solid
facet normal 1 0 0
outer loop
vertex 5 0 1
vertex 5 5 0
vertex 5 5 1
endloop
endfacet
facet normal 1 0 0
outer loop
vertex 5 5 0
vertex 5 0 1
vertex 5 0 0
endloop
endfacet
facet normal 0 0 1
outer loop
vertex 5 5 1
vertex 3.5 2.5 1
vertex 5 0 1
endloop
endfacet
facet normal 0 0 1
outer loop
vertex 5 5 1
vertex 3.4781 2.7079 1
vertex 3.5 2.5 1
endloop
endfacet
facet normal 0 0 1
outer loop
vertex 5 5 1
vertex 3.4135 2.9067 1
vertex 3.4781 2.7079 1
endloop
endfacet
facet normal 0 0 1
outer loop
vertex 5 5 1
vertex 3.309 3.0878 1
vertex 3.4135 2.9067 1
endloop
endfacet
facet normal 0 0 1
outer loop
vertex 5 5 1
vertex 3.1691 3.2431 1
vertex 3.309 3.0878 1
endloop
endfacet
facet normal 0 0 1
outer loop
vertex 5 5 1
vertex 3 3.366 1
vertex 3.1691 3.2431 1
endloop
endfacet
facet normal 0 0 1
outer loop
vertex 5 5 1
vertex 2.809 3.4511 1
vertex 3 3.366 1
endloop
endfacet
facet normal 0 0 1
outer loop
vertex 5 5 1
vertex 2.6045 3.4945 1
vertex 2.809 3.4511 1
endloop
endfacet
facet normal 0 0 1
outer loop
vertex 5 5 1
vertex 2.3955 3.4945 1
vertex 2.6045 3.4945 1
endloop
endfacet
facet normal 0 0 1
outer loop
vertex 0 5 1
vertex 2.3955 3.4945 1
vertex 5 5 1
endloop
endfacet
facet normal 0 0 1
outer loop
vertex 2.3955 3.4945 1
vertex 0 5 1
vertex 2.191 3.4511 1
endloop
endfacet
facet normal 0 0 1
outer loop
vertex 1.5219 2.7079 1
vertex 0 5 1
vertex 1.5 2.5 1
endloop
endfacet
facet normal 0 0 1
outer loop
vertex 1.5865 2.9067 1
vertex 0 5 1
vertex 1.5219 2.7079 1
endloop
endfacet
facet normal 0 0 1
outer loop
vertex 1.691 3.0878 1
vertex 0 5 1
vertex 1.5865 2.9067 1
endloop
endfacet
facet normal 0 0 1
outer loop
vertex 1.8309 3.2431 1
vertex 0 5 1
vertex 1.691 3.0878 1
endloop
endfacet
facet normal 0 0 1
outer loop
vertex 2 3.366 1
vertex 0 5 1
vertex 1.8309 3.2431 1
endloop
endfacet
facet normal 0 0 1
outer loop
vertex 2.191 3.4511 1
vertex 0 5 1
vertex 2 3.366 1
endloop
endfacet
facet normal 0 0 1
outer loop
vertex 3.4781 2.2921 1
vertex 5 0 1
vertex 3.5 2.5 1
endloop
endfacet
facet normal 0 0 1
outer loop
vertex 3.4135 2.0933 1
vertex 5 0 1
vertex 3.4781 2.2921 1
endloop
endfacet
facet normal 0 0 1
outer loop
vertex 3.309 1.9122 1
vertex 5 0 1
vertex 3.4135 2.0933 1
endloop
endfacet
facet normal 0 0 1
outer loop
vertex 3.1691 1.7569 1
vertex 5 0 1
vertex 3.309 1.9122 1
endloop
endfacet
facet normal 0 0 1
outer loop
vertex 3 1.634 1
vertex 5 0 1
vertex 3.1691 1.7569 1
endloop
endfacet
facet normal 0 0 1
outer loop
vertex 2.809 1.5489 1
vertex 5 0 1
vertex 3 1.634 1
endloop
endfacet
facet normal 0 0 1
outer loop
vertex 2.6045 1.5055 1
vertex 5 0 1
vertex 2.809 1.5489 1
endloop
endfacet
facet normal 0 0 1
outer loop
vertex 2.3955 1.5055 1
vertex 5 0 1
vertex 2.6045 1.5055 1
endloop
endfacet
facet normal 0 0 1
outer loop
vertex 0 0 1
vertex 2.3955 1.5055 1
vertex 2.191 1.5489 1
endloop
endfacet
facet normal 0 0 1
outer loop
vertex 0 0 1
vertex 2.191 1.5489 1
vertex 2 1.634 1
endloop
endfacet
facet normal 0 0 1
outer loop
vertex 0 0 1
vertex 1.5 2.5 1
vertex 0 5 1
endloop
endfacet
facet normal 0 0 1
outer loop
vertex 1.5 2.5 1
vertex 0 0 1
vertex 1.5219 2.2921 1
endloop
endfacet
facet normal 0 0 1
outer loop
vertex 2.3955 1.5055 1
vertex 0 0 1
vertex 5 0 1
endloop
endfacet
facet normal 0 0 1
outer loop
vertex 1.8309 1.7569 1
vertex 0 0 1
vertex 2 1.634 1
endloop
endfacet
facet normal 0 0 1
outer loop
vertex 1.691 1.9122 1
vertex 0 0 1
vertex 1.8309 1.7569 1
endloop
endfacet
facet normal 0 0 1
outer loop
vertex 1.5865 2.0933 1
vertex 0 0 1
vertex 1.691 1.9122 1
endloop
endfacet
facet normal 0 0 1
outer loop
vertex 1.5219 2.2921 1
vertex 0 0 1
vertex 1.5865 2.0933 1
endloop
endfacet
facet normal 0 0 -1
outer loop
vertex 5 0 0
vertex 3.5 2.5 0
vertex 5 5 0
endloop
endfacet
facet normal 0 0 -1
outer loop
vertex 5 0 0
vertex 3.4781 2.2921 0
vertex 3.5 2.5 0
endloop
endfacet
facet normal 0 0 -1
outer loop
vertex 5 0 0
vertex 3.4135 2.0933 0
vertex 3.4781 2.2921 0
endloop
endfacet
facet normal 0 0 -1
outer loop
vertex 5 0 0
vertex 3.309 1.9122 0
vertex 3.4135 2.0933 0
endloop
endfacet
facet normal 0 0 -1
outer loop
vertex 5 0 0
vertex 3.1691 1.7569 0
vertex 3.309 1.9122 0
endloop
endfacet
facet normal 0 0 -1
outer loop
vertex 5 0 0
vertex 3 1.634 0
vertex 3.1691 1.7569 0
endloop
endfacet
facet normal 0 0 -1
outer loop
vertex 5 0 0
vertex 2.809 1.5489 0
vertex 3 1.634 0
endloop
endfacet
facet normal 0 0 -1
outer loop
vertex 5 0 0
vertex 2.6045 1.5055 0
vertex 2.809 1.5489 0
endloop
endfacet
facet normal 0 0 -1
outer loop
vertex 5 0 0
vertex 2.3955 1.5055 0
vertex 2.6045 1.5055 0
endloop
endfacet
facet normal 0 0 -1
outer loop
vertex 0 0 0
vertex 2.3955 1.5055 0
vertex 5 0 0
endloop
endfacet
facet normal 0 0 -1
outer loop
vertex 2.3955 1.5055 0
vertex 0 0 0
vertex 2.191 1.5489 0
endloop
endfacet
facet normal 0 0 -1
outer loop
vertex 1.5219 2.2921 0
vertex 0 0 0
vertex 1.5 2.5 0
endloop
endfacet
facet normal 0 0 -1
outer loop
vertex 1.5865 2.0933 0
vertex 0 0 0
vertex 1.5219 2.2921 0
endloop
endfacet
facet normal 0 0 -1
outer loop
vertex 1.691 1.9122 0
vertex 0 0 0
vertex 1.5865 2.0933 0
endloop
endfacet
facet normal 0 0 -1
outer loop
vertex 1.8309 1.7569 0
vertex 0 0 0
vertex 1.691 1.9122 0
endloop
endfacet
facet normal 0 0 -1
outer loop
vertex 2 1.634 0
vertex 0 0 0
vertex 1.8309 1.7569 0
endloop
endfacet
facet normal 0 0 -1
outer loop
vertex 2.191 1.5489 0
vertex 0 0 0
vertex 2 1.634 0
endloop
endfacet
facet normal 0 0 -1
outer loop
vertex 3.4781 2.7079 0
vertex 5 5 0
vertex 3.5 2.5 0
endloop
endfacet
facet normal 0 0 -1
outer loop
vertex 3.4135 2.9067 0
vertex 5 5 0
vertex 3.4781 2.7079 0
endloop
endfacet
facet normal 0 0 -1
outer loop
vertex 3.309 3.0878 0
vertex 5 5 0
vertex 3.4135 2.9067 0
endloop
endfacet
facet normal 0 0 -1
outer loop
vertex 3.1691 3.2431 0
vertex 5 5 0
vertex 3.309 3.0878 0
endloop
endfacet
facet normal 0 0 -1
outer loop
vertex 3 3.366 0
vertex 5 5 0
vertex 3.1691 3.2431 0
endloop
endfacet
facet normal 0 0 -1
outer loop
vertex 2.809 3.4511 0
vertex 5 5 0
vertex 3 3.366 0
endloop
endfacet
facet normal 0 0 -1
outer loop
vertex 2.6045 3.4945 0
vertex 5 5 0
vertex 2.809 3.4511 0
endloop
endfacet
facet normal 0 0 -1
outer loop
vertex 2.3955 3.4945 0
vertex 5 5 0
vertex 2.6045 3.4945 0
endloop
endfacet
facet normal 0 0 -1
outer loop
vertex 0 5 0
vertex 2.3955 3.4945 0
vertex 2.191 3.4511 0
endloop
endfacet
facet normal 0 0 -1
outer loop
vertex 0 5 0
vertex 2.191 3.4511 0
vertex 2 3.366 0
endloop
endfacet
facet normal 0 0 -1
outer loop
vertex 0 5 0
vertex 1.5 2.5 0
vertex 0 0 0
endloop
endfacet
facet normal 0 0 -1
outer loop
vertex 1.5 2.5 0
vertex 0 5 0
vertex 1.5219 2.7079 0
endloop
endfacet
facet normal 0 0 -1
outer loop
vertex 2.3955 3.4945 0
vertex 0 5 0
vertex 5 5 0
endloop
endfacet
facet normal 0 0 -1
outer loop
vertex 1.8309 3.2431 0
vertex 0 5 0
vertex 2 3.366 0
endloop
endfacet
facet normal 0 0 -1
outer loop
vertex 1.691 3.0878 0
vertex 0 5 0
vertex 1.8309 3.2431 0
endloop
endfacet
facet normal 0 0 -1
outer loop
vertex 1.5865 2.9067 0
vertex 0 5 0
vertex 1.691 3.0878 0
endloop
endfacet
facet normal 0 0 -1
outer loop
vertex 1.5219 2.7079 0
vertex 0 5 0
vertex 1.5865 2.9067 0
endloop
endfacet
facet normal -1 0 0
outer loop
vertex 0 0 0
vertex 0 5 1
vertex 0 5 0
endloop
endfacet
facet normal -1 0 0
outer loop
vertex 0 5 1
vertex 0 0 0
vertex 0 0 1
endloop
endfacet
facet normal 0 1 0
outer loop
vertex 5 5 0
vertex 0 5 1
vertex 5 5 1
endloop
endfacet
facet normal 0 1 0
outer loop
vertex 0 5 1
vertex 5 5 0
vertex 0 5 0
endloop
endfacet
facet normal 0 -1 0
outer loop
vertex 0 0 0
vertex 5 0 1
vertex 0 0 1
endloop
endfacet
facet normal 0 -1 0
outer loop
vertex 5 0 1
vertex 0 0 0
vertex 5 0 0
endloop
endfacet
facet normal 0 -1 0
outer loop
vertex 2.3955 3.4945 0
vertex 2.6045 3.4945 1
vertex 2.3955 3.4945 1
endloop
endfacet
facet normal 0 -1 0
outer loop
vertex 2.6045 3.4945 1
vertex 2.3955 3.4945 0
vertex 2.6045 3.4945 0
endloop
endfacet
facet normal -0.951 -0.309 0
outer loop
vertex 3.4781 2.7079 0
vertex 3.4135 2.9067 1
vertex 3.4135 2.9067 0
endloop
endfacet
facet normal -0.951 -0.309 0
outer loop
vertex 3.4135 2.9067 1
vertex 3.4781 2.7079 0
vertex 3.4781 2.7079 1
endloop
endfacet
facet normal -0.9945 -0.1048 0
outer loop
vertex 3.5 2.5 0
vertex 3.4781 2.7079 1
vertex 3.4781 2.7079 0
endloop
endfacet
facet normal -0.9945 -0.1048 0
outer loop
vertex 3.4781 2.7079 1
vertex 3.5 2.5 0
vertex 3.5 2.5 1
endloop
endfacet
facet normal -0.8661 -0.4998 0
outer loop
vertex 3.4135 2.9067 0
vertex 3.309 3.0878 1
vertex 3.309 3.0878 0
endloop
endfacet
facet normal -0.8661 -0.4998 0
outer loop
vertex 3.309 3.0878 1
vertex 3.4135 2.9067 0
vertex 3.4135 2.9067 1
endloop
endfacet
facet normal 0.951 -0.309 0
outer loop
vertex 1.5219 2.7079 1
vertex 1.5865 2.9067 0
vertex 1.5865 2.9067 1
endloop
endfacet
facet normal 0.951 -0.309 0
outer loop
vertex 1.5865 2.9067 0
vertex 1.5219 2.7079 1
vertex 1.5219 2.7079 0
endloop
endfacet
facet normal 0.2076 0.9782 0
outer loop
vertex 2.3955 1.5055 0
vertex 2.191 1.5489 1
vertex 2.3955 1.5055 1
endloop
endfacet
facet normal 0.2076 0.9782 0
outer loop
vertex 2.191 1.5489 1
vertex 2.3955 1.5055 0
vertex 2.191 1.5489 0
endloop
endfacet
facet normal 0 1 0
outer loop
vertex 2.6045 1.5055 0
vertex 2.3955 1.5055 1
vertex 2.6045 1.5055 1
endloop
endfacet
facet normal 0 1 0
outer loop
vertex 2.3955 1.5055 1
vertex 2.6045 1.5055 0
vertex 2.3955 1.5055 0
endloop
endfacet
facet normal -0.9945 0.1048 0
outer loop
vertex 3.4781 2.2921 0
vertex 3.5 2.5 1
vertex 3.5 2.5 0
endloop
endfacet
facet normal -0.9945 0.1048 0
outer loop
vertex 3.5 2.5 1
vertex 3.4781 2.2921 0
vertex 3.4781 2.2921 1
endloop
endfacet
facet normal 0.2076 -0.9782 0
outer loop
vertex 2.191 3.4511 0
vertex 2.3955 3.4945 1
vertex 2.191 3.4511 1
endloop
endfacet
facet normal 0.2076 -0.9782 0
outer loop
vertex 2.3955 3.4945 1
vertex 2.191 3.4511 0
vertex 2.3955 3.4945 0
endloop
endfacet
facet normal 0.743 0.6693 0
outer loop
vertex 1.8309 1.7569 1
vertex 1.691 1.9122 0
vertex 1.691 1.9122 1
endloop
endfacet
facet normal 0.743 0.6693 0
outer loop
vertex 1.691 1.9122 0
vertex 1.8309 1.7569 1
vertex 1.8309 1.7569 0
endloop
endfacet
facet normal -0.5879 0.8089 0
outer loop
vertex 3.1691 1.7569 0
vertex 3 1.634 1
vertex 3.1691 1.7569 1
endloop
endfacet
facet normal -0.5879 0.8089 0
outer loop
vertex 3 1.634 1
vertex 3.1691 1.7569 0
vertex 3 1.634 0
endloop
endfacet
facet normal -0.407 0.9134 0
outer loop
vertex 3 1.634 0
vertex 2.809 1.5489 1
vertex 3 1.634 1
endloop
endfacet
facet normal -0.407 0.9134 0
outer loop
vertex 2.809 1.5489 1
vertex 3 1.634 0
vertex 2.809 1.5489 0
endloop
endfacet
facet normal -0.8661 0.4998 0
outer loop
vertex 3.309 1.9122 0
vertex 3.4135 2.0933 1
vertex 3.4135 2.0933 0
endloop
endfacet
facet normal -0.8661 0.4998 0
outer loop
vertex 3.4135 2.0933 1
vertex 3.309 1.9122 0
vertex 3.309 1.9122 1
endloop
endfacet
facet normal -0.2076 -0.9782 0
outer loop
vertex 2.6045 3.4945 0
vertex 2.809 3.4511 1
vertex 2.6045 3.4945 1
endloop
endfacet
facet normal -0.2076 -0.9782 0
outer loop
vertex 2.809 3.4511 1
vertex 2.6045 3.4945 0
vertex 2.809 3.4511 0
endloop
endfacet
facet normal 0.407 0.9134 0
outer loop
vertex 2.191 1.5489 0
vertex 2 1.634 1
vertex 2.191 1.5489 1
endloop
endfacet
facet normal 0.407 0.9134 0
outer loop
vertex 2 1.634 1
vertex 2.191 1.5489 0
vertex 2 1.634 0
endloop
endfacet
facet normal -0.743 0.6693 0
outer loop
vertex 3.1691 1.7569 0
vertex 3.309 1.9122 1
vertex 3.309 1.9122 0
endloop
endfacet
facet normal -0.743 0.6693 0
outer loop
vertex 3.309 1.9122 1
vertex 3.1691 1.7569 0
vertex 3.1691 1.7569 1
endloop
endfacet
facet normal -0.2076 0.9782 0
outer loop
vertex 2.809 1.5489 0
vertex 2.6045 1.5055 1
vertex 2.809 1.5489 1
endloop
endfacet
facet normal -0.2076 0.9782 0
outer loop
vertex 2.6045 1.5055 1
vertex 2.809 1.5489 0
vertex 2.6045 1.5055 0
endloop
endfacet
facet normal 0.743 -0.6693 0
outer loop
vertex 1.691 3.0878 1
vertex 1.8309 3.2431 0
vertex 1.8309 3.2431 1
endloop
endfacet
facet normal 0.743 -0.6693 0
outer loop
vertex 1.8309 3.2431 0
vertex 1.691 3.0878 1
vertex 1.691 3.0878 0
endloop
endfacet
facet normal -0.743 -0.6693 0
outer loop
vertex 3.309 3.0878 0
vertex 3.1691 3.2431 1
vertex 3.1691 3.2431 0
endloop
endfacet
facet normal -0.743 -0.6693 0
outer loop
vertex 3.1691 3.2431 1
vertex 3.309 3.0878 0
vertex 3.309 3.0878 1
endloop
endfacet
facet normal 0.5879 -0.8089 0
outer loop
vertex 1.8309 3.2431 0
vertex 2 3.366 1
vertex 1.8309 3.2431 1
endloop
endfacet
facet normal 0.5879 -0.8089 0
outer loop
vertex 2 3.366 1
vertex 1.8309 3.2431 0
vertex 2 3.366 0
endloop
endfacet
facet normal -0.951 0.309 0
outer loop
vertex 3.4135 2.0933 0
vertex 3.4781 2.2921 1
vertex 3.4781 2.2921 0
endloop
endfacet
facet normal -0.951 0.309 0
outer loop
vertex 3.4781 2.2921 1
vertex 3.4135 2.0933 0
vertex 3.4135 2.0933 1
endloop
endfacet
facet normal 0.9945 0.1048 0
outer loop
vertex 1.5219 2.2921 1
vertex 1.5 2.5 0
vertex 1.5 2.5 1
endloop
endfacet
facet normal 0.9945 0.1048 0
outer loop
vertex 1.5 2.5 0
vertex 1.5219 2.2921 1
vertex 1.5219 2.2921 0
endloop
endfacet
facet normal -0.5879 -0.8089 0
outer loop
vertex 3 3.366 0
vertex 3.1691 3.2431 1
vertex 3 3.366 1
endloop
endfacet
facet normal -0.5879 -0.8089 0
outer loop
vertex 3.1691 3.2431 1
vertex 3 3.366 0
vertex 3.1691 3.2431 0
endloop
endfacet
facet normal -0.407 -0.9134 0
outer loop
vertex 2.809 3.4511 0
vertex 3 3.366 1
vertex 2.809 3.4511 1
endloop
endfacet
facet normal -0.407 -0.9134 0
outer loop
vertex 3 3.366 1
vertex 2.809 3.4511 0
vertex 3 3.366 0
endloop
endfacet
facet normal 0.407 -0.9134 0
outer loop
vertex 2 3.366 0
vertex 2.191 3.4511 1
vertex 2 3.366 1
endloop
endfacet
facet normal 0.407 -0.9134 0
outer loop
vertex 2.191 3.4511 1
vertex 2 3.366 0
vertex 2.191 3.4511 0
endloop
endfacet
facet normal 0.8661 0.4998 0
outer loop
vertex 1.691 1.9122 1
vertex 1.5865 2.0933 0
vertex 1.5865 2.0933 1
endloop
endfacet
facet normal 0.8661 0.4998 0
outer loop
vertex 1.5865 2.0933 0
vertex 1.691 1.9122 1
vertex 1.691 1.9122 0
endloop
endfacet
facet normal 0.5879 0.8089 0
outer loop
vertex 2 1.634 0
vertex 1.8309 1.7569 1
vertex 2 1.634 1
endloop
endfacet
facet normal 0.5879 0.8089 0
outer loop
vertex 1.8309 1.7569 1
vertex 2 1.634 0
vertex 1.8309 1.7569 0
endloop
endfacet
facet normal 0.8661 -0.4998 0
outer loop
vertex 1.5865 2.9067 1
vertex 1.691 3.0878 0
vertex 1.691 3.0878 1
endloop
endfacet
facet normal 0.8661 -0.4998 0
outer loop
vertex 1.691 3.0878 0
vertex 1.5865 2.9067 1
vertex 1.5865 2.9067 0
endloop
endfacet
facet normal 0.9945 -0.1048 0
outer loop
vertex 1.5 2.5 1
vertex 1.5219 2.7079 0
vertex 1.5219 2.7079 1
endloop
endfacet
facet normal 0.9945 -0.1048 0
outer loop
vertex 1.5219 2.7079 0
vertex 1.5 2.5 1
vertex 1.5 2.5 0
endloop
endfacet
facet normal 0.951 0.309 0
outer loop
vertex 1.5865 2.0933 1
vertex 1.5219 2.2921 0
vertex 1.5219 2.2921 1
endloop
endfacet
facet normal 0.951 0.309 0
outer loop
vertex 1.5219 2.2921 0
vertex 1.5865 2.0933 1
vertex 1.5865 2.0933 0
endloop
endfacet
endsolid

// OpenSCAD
$fn = 30;

difference() {
    cube([5,5,1]);
    translate([2.5, 2.5, 0]){
        cylinder(r=1, h=1);
    }
}
